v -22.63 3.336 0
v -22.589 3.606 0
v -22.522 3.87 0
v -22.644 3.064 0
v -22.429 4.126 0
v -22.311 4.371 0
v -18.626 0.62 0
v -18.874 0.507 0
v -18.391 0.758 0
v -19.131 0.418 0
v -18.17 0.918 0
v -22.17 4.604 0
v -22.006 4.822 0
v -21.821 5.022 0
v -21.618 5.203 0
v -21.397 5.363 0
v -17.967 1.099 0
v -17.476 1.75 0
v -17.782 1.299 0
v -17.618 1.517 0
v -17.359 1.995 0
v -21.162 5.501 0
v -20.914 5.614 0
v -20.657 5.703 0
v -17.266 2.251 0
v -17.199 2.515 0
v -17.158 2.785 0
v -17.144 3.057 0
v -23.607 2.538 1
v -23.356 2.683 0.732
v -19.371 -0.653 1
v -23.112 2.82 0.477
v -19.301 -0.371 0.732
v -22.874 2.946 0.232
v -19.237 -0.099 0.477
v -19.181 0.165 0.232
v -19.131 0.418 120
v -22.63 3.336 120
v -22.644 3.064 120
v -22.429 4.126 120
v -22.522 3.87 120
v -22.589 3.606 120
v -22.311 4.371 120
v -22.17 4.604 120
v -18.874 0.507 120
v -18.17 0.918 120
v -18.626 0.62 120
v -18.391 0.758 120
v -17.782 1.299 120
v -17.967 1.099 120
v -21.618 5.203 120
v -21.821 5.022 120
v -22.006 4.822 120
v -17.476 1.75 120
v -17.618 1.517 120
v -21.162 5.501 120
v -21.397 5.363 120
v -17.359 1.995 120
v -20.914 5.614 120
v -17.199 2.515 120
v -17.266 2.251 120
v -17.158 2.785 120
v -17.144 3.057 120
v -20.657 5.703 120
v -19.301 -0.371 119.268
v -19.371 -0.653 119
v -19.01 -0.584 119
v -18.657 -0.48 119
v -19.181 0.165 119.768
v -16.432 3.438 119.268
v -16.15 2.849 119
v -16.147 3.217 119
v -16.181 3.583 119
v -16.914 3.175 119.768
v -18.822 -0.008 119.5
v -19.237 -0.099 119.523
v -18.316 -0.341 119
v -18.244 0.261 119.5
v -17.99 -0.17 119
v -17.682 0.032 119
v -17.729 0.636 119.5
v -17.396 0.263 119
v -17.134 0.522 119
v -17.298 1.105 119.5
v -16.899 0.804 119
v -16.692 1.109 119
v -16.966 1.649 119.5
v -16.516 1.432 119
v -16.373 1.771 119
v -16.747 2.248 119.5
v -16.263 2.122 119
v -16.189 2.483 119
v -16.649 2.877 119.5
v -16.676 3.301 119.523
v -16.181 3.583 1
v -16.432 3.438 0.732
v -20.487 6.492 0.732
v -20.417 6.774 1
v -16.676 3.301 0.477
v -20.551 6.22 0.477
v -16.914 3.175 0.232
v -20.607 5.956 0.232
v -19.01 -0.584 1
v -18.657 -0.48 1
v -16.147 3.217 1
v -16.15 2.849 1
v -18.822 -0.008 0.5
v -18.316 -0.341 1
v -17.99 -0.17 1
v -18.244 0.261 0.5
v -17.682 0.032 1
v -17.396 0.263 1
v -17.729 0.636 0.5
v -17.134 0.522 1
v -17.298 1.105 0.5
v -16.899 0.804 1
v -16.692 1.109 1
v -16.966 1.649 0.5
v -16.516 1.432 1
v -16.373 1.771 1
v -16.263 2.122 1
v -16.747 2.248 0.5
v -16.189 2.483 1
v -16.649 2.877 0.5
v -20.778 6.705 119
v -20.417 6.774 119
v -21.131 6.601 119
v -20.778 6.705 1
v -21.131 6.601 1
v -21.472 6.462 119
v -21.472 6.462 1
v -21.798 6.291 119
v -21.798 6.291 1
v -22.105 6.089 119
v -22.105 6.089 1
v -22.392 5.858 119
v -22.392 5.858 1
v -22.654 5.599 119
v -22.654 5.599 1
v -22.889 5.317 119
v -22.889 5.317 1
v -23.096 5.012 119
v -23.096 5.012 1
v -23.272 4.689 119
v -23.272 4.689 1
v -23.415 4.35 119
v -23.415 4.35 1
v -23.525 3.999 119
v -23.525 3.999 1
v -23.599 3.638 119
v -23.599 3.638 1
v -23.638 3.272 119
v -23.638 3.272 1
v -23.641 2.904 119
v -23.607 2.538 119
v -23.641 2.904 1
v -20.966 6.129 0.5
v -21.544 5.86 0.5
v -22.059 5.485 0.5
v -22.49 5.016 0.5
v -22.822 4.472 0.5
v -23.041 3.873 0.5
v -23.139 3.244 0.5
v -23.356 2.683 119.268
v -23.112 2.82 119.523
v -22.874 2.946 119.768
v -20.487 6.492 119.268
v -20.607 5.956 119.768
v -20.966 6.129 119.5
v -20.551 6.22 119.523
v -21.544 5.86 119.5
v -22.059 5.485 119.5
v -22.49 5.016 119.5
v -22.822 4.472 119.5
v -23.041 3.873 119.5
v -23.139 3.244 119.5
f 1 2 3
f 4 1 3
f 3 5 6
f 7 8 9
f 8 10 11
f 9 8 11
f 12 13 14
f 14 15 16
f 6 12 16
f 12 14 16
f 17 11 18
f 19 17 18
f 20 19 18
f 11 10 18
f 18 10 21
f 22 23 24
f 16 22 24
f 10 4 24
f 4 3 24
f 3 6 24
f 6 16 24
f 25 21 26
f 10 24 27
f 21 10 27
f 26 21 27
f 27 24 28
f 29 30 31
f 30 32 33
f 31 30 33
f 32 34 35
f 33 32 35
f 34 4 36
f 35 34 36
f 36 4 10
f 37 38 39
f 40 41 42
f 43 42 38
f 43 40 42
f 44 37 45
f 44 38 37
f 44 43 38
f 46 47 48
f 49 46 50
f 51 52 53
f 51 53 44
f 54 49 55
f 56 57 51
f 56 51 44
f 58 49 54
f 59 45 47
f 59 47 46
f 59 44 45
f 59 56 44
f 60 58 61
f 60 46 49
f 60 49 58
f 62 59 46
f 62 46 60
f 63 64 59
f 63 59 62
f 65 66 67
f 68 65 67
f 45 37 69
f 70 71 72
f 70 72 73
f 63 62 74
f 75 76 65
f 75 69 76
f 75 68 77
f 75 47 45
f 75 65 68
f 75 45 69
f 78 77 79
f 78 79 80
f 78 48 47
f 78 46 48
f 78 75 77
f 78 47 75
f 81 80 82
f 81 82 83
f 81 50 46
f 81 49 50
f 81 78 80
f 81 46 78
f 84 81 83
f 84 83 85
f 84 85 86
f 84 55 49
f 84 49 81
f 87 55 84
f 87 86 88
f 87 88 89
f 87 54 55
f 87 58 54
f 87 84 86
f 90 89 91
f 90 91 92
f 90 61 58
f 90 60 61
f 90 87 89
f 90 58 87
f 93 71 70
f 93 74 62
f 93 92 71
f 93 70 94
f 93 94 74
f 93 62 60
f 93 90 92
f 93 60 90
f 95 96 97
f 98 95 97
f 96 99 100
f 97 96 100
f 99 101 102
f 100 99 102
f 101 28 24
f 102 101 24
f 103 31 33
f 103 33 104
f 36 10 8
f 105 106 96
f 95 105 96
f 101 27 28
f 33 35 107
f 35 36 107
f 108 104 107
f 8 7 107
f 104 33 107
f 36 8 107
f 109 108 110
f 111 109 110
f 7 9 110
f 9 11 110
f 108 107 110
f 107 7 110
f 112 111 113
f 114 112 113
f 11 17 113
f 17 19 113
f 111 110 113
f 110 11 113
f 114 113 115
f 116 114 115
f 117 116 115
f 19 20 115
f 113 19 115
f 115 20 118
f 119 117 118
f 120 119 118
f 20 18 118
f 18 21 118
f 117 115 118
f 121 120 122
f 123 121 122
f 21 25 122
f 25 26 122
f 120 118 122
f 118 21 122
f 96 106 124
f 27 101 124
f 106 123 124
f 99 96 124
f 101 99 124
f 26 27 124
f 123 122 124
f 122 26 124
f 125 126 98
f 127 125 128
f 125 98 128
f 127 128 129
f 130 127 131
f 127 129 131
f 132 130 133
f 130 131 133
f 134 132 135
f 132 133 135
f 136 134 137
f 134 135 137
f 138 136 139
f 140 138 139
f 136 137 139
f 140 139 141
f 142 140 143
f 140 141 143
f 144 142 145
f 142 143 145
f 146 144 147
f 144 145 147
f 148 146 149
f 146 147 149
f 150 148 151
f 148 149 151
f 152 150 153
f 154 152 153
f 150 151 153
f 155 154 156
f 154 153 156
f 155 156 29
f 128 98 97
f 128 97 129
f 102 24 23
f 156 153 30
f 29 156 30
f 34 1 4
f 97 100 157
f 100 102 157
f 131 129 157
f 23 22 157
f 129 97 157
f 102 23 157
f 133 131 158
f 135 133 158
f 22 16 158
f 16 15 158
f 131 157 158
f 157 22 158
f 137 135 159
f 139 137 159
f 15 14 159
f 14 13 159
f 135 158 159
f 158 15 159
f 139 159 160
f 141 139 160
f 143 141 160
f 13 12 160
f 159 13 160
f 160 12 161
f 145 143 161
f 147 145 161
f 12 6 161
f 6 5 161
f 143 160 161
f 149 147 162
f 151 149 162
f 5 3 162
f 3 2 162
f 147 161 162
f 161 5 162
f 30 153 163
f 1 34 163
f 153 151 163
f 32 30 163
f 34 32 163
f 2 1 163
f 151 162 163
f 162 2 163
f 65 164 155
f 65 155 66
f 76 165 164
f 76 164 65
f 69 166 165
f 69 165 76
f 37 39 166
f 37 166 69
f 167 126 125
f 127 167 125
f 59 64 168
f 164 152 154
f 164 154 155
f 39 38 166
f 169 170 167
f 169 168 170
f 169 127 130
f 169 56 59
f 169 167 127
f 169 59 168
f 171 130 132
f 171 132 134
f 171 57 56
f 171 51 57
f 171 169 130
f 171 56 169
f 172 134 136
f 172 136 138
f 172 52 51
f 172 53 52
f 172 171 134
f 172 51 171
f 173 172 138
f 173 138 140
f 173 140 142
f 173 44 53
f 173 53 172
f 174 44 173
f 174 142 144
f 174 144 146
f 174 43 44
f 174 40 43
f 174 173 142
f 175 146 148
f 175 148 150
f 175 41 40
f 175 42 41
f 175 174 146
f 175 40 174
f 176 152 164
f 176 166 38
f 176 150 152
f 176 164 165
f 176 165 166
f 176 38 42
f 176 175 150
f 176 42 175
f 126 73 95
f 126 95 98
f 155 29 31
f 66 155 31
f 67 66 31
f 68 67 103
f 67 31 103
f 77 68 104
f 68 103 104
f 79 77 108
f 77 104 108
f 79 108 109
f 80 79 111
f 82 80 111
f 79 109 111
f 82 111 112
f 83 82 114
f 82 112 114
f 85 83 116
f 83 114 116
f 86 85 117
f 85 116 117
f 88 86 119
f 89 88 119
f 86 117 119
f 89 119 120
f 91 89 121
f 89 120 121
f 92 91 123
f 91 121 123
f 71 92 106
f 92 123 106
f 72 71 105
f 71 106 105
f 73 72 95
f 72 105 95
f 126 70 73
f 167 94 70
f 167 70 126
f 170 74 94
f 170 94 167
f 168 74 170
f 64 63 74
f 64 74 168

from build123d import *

# Parameters (mm, degrees)
BOSS_EXTRUDE1_DEPTH = 120
END_SIZE            = 1


with BuildPart() as part:
    # Sketch1 → Boss-Extrude1 (new body)
    with BuildSketch(Plane.XY):
        with BuildLine():
            Line((-16.18058706286363, 3.583270500183823), (-20.41674499500726, 6.773876394671033))
            ThreePointArc((-20.41674499500726, 6.773876394671035), (-22.889384976175005, 5.316593545441291), (-23.607350889494484, 2.5377184625273967))
            Line((-23.607350889494484, 2.5377184625273967), (-19.371192957350857, -0.6528874319598208))
            ThreePointArc((-19.371192957350857, -0.6528874319598175), (-17.06351759251198, 0.6006072959958577), (-16.14396897617906, 3.0604944813556076))
            ThreePointArc((-16.14396897617906, 3.0604944813556085), (-16.153134699247452, 3.3225229388436817), (-16.180587062863637, 3.583270500183822))
        make_face()
    extrude(amount=BOSS_EXTRUDE1_DEPTH)

    # End
    end_edges = [part.edges().sort_by_distance(p)[0] for p in [
        (-22.889384976175005, 5.316593545441292, 120),
        (-21.48927192342267, 0.9424155152837879, 120),
        (-16.89855297618315, 0.8043954172700718, 120),
        (-16.898552976183115, 0.8043954172699284, 0),
        (-18.298666028935443, 5.1785734474274285, 120),
        (-21.48927192342267, 0.9424155152837879, 0),
        (-22.889384976175005, 5.316593545441292, 0),
        (-18.298666028935443, 5.1785734474274285, 0),
    ]]
    chamfer(end_edges, length=END_SIZE)


solid = part.part
